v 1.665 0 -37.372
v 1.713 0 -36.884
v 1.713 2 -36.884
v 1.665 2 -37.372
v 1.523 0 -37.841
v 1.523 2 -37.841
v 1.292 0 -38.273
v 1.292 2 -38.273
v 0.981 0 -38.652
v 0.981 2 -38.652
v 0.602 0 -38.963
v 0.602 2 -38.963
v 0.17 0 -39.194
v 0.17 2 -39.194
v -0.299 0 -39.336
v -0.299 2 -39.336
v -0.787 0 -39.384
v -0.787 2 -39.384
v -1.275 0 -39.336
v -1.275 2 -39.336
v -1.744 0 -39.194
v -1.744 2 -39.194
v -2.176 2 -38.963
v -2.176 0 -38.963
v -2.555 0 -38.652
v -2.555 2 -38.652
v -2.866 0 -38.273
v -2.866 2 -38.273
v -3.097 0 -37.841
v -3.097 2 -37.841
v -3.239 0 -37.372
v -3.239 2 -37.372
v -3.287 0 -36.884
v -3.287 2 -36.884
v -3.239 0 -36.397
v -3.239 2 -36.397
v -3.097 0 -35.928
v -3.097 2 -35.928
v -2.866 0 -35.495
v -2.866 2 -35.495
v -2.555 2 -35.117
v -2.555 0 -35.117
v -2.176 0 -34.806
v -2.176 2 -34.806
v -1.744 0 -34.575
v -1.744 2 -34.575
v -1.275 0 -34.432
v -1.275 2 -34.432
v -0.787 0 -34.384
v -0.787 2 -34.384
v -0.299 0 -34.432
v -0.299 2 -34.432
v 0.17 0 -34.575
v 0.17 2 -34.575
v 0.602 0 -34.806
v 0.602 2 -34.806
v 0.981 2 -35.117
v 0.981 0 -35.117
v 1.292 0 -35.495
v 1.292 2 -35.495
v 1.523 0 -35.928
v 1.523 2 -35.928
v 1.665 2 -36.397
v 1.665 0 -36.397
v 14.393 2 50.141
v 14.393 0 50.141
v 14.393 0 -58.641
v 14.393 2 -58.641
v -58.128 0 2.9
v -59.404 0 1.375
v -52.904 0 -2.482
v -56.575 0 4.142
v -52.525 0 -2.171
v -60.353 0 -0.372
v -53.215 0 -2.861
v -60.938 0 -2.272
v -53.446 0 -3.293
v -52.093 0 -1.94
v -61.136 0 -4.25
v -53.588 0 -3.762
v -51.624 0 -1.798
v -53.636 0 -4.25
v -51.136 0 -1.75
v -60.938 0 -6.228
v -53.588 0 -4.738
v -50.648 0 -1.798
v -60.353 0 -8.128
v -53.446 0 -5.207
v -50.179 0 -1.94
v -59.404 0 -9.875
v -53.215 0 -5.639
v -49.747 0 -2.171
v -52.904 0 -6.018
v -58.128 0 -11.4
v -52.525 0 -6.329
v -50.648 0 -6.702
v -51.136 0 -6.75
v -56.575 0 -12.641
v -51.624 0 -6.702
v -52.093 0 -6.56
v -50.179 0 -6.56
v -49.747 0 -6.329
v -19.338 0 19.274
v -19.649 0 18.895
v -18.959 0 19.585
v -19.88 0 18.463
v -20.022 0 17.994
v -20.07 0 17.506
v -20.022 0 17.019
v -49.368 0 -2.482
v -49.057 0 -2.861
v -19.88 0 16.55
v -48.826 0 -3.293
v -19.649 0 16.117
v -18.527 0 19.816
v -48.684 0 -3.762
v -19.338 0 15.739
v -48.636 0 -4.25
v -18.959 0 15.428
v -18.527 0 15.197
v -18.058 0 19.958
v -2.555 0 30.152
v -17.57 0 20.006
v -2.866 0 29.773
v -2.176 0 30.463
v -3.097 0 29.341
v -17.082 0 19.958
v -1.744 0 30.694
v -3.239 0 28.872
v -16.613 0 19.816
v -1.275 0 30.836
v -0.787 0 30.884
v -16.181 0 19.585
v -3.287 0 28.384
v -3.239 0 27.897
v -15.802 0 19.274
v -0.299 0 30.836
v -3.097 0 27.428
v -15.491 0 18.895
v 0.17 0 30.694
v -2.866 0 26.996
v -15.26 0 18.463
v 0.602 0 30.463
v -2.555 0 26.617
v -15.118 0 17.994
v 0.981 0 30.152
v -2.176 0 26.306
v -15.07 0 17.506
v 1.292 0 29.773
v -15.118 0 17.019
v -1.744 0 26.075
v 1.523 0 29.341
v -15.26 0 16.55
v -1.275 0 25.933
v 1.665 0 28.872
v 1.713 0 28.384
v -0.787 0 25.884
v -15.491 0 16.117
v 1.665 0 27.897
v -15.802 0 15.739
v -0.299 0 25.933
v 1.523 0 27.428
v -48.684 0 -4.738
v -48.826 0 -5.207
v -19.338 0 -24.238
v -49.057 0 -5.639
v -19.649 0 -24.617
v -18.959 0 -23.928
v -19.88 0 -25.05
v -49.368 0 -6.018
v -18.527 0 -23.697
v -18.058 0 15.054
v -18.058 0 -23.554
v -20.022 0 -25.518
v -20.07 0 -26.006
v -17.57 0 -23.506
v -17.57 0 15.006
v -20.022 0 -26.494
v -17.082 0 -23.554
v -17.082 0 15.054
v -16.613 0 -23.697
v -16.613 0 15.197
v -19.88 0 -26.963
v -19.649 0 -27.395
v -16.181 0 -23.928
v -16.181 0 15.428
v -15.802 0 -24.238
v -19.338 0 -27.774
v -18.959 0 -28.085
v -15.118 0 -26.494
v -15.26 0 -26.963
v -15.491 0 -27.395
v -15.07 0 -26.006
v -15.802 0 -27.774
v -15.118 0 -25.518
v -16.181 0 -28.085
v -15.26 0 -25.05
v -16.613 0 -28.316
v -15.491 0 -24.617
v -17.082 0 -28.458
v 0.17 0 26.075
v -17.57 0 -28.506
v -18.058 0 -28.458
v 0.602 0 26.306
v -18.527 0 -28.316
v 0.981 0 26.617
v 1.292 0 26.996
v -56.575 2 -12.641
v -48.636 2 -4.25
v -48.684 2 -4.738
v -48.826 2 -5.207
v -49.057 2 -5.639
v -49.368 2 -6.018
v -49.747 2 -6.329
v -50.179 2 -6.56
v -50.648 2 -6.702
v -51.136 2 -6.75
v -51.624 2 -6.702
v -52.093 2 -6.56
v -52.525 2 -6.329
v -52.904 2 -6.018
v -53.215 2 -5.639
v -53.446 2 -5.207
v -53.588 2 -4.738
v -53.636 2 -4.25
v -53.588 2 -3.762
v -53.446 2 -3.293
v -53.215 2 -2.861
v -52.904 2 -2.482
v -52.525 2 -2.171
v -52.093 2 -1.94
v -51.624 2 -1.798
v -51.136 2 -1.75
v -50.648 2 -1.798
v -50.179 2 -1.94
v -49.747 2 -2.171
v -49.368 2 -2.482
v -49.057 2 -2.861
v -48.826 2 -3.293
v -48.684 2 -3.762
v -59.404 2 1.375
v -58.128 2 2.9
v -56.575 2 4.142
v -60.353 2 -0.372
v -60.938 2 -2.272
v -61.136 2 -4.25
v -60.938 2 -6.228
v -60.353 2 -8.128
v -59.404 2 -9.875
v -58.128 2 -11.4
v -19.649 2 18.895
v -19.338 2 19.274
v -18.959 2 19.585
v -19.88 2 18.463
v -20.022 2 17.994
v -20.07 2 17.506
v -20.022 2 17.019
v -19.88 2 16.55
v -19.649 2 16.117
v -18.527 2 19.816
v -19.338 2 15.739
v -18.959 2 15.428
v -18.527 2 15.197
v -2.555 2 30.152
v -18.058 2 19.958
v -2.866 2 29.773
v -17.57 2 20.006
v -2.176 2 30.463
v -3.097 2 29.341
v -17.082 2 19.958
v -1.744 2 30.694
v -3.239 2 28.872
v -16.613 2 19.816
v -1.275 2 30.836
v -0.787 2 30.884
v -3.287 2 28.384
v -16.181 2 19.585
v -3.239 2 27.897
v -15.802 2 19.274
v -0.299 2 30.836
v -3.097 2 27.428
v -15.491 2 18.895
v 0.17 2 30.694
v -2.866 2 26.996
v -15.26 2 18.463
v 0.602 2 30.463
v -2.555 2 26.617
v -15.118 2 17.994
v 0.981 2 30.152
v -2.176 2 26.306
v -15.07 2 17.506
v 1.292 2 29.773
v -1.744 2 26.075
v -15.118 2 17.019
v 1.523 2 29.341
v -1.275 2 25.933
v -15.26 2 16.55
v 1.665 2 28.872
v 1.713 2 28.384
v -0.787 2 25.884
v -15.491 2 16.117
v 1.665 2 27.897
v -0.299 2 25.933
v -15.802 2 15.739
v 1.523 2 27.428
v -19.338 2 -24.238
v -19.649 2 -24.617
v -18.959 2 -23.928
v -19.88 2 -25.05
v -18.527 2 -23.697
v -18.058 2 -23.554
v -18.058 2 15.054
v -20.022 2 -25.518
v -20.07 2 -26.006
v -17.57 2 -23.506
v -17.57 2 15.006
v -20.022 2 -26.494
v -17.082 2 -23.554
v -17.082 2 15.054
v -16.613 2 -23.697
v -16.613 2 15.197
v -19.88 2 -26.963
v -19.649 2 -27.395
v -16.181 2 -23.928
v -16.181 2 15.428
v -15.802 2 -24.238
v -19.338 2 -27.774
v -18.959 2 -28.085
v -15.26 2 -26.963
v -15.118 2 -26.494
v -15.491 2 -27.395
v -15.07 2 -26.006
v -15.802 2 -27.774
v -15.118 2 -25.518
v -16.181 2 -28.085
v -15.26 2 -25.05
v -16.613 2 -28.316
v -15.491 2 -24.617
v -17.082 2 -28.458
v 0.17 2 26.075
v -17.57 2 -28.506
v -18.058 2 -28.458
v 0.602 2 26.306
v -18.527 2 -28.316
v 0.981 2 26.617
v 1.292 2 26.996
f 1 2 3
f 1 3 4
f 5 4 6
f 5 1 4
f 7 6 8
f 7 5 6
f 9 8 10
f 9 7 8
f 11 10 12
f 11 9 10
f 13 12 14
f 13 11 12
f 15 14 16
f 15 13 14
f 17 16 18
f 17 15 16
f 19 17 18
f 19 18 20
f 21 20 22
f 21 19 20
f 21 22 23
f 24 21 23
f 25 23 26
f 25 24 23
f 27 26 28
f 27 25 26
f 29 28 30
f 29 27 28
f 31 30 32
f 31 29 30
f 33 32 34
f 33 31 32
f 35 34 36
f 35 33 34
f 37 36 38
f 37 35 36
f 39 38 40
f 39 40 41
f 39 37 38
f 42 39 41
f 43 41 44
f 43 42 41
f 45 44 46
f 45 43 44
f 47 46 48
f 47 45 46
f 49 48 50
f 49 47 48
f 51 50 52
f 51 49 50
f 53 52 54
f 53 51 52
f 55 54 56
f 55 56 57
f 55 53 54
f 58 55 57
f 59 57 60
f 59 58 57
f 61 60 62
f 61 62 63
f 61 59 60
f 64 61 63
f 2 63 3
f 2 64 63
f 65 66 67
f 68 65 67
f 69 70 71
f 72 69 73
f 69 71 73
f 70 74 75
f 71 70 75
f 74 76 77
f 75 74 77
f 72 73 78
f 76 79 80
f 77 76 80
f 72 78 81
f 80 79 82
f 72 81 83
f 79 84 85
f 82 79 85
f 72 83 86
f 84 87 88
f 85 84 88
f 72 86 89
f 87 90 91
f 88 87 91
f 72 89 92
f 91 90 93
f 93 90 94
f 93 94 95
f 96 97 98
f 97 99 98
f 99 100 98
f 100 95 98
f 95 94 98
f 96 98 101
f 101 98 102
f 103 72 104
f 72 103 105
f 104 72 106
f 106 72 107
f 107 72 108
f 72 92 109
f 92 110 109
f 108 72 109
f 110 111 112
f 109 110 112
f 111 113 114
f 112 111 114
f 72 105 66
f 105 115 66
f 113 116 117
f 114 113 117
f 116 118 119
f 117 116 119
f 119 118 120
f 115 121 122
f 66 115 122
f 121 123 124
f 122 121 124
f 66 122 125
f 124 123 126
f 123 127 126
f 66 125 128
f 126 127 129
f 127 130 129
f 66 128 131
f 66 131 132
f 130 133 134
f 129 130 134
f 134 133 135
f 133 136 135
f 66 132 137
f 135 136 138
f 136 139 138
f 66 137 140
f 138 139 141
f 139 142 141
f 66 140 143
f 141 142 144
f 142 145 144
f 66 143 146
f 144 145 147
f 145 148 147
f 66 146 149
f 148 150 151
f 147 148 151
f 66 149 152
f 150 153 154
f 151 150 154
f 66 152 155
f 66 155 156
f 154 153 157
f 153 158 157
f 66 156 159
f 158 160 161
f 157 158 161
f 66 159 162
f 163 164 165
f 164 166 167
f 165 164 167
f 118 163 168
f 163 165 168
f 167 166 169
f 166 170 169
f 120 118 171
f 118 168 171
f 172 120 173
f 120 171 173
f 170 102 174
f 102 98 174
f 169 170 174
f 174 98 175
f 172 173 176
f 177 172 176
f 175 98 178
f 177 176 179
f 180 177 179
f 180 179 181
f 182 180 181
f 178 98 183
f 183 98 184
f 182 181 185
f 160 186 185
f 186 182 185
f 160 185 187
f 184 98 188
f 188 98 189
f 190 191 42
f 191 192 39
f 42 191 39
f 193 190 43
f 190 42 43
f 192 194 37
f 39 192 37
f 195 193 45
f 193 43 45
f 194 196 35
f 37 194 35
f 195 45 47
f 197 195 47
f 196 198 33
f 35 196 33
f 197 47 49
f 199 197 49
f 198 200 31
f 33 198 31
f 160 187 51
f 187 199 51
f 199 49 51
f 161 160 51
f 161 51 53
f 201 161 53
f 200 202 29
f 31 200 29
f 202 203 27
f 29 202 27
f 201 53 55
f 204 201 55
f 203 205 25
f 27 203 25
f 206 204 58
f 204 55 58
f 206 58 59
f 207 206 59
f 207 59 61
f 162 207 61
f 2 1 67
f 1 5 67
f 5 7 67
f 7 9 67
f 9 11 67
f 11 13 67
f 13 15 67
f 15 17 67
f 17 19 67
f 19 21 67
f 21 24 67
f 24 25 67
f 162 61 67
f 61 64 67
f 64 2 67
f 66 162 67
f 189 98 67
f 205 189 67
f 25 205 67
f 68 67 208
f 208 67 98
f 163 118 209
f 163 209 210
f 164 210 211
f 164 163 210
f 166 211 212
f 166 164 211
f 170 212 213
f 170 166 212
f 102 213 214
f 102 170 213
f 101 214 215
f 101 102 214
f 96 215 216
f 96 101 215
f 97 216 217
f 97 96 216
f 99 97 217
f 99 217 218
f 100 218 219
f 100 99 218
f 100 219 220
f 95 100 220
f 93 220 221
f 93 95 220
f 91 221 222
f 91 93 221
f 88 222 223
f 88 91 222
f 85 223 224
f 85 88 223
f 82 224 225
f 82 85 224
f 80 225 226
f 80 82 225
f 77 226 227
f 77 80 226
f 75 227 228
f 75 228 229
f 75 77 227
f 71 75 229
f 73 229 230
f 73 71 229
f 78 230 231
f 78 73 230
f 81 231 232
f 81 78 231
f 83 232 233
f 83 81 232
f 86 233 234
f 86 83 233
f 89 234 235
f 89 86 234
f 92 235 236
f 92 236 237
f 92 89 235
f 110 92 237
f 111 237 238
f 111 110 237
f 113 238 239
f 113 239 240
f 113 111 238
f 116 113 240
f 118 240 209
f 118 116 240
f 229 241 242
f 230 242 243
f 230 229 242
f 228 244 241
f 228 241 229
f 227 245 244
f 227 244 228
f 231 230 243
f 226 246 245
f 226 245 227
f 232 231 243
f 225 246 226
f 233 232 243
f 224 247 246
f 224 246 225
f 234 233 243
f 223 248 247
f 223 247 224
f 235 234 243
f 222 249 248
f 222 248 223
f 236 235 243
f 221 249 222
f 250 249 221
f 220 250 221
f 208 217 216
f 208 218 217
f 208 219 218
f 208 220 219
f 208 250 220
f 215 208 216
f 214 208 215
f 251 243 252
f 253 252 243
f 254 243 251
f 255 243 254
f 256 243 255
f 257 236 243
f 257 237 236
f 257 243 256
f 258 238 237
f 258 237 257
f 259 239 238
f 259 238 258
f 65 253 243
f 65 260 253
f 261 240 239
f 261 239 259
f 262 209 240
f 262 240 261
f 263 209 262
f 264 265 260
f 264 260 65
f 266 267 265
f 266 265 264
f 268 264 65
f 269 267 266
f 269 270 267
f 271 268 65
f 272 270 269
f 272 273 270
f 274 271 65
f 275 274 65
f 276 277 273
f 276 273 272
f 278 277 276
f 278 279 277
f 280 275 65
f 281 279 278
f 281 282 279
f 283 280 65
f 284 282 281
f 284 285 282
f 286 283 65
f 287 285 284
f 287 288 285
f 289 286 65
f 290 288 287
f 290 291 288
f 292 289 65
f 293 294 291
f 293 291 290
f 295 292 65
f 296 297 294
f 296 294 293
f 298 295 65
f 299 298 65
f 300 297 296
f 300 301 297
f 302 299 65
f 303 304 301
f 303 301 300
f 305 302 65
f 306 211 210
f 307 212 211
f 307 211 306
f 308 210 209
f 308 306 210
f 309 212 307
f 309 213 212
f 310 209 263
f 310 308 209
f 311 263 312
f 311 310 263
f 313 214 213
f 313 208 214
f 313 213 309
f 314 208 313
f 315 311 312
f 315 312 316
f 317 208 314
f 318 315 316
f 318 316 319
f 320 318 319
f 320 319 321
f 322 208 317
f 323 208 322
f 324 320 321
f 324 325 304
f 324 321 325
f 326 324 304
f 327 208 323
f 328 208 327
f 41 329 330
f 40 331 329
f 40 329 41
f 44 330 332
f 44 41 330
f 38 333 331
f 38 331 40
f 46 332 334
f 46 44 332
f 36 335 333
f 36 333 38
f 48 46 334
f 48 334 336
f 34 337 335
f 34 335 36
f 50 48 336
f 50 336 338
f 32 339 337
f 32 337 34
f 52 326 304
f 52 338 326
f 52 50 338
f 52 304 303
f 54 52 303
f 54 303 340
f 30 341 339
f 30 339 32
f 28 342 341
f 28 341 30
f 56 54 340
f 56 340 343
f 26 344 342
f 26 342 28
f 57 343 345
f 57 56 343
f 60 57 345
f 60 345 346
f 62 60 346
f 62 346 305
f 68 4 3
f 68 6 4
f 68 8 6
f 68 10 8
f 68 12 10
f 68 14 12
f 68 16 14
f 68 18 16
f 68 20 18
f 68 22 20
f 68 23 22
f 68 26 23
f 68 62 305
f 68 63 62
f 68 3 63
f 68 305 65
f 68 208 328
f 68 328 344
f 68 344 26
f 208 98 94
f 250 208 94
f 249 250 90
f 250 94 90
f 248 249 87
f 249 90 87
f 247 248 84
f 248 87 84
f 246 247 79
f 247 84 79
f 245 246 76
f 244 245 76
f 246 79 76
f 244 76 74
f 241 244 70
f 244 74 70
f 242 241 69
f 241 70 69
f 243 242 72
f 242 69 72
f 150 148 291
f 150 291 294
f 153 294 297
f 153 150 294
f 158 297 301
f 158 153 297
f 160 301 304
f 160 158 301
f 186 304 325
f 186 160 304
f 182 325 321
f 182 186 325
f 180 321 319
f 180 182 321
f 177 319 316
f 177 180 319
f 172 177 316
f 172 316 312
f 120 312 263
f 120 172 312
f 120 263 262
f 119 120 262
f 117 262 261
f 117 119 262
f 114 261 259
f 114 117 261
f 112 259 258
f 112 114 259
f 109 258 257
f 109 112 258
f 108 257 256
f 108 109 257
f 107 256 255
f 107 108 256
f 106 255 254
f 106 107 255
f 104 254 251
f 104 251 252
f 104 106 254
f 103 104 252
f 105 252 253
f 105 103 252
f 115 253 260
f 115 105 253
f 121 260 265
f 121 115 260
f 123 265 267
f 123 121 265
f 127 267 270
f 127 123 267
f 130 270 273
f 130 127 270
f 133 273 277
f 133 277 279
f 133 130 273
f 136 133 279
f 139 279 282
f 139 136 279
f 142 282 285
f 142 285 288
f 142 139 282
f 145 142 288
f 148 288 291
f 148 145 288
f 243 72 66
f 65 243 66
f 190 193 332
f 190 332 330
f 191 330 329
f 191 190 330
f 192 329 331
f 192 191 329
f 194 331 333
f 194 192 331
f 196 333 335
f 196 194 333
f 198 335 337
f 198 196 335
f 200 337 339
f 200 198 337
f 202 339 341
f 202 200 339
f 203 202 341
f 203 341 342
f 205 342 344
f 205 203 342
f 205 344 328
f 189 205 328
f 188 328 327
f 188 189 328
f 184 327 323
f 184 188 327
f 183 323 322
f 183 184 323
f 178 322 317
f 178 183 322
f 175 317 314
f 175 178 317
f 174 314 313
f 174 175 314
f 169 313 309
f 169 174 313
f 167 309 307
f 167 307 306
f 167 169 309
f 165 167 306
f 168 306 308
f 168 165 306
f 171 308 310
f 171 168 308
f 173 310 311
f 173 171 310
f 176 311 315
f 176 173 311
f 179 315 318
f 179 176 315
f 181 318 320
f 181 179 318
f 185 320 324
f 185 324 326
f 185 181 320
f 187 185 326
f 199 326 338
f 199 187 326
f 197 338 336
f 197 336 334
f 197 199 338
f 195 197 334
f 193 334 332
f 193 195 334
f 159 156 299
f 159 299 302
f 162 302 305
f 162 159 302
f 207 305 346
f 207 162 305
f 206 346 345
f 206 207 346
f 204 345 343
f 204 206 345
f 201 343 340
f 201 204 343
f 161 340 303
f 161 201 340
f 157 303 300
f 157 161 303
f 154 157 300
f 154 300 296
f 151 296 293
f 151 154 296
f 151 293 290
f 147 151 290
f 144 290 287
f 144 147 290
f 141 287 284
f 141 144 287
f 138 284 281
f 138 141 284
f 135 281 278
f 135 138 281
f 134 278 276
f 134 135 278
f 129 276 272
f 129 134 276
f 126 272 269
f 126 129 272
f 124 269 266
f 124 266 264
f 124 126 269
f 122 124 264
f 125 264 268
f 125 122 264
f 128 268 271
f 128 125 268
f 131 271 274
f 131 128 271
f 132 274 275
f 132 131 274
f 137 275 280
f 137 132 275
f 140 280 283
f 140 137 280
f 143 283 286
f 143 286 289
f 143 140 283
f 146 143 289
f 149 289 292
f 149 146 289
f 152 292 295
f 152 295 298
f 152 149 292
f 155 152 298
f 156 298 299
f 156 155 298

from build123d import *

# Parameters (mm, degrees)
SKETCH2_R           = 2.5
BOSS_EXTRUDE2_DEPTH = 2


with BuildPart() as part:
    # Sketch2 → Boss-Extrude2 (new body)
    with BuildSketch(Plane(origin=(0, 0, 0), x_dir=(1, 0, 0), z_dir=(0, 1, 0))):
        with BuildLine():
            Line((14.393173744, 58.640634372), (-56.574951574, 12.641394771))
            ThreePointArc((-56.574951574, 12.641394771), (-61.135882078, 4.249939413), (-56.574951574, -4.141515944))
            Line((-56.574951574, -4.141515944), (14.393173744, -50.140755545))
            Line((14.393173744, -50.140755545), (14.393173744, 58.640634372))
        make_face()
        with Locations((-51.135882078, 4.249939413)):
            Circle(SKETCH2_R, mode=Mode.SUBTRACT)
        with Locations((-17.570060648, 26.006217397)):
            Circle(SKETCH2_R, mode=Mode.SUBTRACT)
        with Locations((-0.787149932, 36.884356389)):
            Circle(SKETCH2_R, mode=Mode.SUBTRACT)
        with Locations((-17.570060648, -17.50633857)):
            Circle(SKETCH2_R, mode=Mode.SUBTRACT)
        with Locations((-0.787149932, -28.384477562)):
            Circle(SKETCH2_R, mode=Mode.SUBTRACT)
    extrude(amount=BOSS_EXTRUDE2_DEPTH)


solid = part.part
